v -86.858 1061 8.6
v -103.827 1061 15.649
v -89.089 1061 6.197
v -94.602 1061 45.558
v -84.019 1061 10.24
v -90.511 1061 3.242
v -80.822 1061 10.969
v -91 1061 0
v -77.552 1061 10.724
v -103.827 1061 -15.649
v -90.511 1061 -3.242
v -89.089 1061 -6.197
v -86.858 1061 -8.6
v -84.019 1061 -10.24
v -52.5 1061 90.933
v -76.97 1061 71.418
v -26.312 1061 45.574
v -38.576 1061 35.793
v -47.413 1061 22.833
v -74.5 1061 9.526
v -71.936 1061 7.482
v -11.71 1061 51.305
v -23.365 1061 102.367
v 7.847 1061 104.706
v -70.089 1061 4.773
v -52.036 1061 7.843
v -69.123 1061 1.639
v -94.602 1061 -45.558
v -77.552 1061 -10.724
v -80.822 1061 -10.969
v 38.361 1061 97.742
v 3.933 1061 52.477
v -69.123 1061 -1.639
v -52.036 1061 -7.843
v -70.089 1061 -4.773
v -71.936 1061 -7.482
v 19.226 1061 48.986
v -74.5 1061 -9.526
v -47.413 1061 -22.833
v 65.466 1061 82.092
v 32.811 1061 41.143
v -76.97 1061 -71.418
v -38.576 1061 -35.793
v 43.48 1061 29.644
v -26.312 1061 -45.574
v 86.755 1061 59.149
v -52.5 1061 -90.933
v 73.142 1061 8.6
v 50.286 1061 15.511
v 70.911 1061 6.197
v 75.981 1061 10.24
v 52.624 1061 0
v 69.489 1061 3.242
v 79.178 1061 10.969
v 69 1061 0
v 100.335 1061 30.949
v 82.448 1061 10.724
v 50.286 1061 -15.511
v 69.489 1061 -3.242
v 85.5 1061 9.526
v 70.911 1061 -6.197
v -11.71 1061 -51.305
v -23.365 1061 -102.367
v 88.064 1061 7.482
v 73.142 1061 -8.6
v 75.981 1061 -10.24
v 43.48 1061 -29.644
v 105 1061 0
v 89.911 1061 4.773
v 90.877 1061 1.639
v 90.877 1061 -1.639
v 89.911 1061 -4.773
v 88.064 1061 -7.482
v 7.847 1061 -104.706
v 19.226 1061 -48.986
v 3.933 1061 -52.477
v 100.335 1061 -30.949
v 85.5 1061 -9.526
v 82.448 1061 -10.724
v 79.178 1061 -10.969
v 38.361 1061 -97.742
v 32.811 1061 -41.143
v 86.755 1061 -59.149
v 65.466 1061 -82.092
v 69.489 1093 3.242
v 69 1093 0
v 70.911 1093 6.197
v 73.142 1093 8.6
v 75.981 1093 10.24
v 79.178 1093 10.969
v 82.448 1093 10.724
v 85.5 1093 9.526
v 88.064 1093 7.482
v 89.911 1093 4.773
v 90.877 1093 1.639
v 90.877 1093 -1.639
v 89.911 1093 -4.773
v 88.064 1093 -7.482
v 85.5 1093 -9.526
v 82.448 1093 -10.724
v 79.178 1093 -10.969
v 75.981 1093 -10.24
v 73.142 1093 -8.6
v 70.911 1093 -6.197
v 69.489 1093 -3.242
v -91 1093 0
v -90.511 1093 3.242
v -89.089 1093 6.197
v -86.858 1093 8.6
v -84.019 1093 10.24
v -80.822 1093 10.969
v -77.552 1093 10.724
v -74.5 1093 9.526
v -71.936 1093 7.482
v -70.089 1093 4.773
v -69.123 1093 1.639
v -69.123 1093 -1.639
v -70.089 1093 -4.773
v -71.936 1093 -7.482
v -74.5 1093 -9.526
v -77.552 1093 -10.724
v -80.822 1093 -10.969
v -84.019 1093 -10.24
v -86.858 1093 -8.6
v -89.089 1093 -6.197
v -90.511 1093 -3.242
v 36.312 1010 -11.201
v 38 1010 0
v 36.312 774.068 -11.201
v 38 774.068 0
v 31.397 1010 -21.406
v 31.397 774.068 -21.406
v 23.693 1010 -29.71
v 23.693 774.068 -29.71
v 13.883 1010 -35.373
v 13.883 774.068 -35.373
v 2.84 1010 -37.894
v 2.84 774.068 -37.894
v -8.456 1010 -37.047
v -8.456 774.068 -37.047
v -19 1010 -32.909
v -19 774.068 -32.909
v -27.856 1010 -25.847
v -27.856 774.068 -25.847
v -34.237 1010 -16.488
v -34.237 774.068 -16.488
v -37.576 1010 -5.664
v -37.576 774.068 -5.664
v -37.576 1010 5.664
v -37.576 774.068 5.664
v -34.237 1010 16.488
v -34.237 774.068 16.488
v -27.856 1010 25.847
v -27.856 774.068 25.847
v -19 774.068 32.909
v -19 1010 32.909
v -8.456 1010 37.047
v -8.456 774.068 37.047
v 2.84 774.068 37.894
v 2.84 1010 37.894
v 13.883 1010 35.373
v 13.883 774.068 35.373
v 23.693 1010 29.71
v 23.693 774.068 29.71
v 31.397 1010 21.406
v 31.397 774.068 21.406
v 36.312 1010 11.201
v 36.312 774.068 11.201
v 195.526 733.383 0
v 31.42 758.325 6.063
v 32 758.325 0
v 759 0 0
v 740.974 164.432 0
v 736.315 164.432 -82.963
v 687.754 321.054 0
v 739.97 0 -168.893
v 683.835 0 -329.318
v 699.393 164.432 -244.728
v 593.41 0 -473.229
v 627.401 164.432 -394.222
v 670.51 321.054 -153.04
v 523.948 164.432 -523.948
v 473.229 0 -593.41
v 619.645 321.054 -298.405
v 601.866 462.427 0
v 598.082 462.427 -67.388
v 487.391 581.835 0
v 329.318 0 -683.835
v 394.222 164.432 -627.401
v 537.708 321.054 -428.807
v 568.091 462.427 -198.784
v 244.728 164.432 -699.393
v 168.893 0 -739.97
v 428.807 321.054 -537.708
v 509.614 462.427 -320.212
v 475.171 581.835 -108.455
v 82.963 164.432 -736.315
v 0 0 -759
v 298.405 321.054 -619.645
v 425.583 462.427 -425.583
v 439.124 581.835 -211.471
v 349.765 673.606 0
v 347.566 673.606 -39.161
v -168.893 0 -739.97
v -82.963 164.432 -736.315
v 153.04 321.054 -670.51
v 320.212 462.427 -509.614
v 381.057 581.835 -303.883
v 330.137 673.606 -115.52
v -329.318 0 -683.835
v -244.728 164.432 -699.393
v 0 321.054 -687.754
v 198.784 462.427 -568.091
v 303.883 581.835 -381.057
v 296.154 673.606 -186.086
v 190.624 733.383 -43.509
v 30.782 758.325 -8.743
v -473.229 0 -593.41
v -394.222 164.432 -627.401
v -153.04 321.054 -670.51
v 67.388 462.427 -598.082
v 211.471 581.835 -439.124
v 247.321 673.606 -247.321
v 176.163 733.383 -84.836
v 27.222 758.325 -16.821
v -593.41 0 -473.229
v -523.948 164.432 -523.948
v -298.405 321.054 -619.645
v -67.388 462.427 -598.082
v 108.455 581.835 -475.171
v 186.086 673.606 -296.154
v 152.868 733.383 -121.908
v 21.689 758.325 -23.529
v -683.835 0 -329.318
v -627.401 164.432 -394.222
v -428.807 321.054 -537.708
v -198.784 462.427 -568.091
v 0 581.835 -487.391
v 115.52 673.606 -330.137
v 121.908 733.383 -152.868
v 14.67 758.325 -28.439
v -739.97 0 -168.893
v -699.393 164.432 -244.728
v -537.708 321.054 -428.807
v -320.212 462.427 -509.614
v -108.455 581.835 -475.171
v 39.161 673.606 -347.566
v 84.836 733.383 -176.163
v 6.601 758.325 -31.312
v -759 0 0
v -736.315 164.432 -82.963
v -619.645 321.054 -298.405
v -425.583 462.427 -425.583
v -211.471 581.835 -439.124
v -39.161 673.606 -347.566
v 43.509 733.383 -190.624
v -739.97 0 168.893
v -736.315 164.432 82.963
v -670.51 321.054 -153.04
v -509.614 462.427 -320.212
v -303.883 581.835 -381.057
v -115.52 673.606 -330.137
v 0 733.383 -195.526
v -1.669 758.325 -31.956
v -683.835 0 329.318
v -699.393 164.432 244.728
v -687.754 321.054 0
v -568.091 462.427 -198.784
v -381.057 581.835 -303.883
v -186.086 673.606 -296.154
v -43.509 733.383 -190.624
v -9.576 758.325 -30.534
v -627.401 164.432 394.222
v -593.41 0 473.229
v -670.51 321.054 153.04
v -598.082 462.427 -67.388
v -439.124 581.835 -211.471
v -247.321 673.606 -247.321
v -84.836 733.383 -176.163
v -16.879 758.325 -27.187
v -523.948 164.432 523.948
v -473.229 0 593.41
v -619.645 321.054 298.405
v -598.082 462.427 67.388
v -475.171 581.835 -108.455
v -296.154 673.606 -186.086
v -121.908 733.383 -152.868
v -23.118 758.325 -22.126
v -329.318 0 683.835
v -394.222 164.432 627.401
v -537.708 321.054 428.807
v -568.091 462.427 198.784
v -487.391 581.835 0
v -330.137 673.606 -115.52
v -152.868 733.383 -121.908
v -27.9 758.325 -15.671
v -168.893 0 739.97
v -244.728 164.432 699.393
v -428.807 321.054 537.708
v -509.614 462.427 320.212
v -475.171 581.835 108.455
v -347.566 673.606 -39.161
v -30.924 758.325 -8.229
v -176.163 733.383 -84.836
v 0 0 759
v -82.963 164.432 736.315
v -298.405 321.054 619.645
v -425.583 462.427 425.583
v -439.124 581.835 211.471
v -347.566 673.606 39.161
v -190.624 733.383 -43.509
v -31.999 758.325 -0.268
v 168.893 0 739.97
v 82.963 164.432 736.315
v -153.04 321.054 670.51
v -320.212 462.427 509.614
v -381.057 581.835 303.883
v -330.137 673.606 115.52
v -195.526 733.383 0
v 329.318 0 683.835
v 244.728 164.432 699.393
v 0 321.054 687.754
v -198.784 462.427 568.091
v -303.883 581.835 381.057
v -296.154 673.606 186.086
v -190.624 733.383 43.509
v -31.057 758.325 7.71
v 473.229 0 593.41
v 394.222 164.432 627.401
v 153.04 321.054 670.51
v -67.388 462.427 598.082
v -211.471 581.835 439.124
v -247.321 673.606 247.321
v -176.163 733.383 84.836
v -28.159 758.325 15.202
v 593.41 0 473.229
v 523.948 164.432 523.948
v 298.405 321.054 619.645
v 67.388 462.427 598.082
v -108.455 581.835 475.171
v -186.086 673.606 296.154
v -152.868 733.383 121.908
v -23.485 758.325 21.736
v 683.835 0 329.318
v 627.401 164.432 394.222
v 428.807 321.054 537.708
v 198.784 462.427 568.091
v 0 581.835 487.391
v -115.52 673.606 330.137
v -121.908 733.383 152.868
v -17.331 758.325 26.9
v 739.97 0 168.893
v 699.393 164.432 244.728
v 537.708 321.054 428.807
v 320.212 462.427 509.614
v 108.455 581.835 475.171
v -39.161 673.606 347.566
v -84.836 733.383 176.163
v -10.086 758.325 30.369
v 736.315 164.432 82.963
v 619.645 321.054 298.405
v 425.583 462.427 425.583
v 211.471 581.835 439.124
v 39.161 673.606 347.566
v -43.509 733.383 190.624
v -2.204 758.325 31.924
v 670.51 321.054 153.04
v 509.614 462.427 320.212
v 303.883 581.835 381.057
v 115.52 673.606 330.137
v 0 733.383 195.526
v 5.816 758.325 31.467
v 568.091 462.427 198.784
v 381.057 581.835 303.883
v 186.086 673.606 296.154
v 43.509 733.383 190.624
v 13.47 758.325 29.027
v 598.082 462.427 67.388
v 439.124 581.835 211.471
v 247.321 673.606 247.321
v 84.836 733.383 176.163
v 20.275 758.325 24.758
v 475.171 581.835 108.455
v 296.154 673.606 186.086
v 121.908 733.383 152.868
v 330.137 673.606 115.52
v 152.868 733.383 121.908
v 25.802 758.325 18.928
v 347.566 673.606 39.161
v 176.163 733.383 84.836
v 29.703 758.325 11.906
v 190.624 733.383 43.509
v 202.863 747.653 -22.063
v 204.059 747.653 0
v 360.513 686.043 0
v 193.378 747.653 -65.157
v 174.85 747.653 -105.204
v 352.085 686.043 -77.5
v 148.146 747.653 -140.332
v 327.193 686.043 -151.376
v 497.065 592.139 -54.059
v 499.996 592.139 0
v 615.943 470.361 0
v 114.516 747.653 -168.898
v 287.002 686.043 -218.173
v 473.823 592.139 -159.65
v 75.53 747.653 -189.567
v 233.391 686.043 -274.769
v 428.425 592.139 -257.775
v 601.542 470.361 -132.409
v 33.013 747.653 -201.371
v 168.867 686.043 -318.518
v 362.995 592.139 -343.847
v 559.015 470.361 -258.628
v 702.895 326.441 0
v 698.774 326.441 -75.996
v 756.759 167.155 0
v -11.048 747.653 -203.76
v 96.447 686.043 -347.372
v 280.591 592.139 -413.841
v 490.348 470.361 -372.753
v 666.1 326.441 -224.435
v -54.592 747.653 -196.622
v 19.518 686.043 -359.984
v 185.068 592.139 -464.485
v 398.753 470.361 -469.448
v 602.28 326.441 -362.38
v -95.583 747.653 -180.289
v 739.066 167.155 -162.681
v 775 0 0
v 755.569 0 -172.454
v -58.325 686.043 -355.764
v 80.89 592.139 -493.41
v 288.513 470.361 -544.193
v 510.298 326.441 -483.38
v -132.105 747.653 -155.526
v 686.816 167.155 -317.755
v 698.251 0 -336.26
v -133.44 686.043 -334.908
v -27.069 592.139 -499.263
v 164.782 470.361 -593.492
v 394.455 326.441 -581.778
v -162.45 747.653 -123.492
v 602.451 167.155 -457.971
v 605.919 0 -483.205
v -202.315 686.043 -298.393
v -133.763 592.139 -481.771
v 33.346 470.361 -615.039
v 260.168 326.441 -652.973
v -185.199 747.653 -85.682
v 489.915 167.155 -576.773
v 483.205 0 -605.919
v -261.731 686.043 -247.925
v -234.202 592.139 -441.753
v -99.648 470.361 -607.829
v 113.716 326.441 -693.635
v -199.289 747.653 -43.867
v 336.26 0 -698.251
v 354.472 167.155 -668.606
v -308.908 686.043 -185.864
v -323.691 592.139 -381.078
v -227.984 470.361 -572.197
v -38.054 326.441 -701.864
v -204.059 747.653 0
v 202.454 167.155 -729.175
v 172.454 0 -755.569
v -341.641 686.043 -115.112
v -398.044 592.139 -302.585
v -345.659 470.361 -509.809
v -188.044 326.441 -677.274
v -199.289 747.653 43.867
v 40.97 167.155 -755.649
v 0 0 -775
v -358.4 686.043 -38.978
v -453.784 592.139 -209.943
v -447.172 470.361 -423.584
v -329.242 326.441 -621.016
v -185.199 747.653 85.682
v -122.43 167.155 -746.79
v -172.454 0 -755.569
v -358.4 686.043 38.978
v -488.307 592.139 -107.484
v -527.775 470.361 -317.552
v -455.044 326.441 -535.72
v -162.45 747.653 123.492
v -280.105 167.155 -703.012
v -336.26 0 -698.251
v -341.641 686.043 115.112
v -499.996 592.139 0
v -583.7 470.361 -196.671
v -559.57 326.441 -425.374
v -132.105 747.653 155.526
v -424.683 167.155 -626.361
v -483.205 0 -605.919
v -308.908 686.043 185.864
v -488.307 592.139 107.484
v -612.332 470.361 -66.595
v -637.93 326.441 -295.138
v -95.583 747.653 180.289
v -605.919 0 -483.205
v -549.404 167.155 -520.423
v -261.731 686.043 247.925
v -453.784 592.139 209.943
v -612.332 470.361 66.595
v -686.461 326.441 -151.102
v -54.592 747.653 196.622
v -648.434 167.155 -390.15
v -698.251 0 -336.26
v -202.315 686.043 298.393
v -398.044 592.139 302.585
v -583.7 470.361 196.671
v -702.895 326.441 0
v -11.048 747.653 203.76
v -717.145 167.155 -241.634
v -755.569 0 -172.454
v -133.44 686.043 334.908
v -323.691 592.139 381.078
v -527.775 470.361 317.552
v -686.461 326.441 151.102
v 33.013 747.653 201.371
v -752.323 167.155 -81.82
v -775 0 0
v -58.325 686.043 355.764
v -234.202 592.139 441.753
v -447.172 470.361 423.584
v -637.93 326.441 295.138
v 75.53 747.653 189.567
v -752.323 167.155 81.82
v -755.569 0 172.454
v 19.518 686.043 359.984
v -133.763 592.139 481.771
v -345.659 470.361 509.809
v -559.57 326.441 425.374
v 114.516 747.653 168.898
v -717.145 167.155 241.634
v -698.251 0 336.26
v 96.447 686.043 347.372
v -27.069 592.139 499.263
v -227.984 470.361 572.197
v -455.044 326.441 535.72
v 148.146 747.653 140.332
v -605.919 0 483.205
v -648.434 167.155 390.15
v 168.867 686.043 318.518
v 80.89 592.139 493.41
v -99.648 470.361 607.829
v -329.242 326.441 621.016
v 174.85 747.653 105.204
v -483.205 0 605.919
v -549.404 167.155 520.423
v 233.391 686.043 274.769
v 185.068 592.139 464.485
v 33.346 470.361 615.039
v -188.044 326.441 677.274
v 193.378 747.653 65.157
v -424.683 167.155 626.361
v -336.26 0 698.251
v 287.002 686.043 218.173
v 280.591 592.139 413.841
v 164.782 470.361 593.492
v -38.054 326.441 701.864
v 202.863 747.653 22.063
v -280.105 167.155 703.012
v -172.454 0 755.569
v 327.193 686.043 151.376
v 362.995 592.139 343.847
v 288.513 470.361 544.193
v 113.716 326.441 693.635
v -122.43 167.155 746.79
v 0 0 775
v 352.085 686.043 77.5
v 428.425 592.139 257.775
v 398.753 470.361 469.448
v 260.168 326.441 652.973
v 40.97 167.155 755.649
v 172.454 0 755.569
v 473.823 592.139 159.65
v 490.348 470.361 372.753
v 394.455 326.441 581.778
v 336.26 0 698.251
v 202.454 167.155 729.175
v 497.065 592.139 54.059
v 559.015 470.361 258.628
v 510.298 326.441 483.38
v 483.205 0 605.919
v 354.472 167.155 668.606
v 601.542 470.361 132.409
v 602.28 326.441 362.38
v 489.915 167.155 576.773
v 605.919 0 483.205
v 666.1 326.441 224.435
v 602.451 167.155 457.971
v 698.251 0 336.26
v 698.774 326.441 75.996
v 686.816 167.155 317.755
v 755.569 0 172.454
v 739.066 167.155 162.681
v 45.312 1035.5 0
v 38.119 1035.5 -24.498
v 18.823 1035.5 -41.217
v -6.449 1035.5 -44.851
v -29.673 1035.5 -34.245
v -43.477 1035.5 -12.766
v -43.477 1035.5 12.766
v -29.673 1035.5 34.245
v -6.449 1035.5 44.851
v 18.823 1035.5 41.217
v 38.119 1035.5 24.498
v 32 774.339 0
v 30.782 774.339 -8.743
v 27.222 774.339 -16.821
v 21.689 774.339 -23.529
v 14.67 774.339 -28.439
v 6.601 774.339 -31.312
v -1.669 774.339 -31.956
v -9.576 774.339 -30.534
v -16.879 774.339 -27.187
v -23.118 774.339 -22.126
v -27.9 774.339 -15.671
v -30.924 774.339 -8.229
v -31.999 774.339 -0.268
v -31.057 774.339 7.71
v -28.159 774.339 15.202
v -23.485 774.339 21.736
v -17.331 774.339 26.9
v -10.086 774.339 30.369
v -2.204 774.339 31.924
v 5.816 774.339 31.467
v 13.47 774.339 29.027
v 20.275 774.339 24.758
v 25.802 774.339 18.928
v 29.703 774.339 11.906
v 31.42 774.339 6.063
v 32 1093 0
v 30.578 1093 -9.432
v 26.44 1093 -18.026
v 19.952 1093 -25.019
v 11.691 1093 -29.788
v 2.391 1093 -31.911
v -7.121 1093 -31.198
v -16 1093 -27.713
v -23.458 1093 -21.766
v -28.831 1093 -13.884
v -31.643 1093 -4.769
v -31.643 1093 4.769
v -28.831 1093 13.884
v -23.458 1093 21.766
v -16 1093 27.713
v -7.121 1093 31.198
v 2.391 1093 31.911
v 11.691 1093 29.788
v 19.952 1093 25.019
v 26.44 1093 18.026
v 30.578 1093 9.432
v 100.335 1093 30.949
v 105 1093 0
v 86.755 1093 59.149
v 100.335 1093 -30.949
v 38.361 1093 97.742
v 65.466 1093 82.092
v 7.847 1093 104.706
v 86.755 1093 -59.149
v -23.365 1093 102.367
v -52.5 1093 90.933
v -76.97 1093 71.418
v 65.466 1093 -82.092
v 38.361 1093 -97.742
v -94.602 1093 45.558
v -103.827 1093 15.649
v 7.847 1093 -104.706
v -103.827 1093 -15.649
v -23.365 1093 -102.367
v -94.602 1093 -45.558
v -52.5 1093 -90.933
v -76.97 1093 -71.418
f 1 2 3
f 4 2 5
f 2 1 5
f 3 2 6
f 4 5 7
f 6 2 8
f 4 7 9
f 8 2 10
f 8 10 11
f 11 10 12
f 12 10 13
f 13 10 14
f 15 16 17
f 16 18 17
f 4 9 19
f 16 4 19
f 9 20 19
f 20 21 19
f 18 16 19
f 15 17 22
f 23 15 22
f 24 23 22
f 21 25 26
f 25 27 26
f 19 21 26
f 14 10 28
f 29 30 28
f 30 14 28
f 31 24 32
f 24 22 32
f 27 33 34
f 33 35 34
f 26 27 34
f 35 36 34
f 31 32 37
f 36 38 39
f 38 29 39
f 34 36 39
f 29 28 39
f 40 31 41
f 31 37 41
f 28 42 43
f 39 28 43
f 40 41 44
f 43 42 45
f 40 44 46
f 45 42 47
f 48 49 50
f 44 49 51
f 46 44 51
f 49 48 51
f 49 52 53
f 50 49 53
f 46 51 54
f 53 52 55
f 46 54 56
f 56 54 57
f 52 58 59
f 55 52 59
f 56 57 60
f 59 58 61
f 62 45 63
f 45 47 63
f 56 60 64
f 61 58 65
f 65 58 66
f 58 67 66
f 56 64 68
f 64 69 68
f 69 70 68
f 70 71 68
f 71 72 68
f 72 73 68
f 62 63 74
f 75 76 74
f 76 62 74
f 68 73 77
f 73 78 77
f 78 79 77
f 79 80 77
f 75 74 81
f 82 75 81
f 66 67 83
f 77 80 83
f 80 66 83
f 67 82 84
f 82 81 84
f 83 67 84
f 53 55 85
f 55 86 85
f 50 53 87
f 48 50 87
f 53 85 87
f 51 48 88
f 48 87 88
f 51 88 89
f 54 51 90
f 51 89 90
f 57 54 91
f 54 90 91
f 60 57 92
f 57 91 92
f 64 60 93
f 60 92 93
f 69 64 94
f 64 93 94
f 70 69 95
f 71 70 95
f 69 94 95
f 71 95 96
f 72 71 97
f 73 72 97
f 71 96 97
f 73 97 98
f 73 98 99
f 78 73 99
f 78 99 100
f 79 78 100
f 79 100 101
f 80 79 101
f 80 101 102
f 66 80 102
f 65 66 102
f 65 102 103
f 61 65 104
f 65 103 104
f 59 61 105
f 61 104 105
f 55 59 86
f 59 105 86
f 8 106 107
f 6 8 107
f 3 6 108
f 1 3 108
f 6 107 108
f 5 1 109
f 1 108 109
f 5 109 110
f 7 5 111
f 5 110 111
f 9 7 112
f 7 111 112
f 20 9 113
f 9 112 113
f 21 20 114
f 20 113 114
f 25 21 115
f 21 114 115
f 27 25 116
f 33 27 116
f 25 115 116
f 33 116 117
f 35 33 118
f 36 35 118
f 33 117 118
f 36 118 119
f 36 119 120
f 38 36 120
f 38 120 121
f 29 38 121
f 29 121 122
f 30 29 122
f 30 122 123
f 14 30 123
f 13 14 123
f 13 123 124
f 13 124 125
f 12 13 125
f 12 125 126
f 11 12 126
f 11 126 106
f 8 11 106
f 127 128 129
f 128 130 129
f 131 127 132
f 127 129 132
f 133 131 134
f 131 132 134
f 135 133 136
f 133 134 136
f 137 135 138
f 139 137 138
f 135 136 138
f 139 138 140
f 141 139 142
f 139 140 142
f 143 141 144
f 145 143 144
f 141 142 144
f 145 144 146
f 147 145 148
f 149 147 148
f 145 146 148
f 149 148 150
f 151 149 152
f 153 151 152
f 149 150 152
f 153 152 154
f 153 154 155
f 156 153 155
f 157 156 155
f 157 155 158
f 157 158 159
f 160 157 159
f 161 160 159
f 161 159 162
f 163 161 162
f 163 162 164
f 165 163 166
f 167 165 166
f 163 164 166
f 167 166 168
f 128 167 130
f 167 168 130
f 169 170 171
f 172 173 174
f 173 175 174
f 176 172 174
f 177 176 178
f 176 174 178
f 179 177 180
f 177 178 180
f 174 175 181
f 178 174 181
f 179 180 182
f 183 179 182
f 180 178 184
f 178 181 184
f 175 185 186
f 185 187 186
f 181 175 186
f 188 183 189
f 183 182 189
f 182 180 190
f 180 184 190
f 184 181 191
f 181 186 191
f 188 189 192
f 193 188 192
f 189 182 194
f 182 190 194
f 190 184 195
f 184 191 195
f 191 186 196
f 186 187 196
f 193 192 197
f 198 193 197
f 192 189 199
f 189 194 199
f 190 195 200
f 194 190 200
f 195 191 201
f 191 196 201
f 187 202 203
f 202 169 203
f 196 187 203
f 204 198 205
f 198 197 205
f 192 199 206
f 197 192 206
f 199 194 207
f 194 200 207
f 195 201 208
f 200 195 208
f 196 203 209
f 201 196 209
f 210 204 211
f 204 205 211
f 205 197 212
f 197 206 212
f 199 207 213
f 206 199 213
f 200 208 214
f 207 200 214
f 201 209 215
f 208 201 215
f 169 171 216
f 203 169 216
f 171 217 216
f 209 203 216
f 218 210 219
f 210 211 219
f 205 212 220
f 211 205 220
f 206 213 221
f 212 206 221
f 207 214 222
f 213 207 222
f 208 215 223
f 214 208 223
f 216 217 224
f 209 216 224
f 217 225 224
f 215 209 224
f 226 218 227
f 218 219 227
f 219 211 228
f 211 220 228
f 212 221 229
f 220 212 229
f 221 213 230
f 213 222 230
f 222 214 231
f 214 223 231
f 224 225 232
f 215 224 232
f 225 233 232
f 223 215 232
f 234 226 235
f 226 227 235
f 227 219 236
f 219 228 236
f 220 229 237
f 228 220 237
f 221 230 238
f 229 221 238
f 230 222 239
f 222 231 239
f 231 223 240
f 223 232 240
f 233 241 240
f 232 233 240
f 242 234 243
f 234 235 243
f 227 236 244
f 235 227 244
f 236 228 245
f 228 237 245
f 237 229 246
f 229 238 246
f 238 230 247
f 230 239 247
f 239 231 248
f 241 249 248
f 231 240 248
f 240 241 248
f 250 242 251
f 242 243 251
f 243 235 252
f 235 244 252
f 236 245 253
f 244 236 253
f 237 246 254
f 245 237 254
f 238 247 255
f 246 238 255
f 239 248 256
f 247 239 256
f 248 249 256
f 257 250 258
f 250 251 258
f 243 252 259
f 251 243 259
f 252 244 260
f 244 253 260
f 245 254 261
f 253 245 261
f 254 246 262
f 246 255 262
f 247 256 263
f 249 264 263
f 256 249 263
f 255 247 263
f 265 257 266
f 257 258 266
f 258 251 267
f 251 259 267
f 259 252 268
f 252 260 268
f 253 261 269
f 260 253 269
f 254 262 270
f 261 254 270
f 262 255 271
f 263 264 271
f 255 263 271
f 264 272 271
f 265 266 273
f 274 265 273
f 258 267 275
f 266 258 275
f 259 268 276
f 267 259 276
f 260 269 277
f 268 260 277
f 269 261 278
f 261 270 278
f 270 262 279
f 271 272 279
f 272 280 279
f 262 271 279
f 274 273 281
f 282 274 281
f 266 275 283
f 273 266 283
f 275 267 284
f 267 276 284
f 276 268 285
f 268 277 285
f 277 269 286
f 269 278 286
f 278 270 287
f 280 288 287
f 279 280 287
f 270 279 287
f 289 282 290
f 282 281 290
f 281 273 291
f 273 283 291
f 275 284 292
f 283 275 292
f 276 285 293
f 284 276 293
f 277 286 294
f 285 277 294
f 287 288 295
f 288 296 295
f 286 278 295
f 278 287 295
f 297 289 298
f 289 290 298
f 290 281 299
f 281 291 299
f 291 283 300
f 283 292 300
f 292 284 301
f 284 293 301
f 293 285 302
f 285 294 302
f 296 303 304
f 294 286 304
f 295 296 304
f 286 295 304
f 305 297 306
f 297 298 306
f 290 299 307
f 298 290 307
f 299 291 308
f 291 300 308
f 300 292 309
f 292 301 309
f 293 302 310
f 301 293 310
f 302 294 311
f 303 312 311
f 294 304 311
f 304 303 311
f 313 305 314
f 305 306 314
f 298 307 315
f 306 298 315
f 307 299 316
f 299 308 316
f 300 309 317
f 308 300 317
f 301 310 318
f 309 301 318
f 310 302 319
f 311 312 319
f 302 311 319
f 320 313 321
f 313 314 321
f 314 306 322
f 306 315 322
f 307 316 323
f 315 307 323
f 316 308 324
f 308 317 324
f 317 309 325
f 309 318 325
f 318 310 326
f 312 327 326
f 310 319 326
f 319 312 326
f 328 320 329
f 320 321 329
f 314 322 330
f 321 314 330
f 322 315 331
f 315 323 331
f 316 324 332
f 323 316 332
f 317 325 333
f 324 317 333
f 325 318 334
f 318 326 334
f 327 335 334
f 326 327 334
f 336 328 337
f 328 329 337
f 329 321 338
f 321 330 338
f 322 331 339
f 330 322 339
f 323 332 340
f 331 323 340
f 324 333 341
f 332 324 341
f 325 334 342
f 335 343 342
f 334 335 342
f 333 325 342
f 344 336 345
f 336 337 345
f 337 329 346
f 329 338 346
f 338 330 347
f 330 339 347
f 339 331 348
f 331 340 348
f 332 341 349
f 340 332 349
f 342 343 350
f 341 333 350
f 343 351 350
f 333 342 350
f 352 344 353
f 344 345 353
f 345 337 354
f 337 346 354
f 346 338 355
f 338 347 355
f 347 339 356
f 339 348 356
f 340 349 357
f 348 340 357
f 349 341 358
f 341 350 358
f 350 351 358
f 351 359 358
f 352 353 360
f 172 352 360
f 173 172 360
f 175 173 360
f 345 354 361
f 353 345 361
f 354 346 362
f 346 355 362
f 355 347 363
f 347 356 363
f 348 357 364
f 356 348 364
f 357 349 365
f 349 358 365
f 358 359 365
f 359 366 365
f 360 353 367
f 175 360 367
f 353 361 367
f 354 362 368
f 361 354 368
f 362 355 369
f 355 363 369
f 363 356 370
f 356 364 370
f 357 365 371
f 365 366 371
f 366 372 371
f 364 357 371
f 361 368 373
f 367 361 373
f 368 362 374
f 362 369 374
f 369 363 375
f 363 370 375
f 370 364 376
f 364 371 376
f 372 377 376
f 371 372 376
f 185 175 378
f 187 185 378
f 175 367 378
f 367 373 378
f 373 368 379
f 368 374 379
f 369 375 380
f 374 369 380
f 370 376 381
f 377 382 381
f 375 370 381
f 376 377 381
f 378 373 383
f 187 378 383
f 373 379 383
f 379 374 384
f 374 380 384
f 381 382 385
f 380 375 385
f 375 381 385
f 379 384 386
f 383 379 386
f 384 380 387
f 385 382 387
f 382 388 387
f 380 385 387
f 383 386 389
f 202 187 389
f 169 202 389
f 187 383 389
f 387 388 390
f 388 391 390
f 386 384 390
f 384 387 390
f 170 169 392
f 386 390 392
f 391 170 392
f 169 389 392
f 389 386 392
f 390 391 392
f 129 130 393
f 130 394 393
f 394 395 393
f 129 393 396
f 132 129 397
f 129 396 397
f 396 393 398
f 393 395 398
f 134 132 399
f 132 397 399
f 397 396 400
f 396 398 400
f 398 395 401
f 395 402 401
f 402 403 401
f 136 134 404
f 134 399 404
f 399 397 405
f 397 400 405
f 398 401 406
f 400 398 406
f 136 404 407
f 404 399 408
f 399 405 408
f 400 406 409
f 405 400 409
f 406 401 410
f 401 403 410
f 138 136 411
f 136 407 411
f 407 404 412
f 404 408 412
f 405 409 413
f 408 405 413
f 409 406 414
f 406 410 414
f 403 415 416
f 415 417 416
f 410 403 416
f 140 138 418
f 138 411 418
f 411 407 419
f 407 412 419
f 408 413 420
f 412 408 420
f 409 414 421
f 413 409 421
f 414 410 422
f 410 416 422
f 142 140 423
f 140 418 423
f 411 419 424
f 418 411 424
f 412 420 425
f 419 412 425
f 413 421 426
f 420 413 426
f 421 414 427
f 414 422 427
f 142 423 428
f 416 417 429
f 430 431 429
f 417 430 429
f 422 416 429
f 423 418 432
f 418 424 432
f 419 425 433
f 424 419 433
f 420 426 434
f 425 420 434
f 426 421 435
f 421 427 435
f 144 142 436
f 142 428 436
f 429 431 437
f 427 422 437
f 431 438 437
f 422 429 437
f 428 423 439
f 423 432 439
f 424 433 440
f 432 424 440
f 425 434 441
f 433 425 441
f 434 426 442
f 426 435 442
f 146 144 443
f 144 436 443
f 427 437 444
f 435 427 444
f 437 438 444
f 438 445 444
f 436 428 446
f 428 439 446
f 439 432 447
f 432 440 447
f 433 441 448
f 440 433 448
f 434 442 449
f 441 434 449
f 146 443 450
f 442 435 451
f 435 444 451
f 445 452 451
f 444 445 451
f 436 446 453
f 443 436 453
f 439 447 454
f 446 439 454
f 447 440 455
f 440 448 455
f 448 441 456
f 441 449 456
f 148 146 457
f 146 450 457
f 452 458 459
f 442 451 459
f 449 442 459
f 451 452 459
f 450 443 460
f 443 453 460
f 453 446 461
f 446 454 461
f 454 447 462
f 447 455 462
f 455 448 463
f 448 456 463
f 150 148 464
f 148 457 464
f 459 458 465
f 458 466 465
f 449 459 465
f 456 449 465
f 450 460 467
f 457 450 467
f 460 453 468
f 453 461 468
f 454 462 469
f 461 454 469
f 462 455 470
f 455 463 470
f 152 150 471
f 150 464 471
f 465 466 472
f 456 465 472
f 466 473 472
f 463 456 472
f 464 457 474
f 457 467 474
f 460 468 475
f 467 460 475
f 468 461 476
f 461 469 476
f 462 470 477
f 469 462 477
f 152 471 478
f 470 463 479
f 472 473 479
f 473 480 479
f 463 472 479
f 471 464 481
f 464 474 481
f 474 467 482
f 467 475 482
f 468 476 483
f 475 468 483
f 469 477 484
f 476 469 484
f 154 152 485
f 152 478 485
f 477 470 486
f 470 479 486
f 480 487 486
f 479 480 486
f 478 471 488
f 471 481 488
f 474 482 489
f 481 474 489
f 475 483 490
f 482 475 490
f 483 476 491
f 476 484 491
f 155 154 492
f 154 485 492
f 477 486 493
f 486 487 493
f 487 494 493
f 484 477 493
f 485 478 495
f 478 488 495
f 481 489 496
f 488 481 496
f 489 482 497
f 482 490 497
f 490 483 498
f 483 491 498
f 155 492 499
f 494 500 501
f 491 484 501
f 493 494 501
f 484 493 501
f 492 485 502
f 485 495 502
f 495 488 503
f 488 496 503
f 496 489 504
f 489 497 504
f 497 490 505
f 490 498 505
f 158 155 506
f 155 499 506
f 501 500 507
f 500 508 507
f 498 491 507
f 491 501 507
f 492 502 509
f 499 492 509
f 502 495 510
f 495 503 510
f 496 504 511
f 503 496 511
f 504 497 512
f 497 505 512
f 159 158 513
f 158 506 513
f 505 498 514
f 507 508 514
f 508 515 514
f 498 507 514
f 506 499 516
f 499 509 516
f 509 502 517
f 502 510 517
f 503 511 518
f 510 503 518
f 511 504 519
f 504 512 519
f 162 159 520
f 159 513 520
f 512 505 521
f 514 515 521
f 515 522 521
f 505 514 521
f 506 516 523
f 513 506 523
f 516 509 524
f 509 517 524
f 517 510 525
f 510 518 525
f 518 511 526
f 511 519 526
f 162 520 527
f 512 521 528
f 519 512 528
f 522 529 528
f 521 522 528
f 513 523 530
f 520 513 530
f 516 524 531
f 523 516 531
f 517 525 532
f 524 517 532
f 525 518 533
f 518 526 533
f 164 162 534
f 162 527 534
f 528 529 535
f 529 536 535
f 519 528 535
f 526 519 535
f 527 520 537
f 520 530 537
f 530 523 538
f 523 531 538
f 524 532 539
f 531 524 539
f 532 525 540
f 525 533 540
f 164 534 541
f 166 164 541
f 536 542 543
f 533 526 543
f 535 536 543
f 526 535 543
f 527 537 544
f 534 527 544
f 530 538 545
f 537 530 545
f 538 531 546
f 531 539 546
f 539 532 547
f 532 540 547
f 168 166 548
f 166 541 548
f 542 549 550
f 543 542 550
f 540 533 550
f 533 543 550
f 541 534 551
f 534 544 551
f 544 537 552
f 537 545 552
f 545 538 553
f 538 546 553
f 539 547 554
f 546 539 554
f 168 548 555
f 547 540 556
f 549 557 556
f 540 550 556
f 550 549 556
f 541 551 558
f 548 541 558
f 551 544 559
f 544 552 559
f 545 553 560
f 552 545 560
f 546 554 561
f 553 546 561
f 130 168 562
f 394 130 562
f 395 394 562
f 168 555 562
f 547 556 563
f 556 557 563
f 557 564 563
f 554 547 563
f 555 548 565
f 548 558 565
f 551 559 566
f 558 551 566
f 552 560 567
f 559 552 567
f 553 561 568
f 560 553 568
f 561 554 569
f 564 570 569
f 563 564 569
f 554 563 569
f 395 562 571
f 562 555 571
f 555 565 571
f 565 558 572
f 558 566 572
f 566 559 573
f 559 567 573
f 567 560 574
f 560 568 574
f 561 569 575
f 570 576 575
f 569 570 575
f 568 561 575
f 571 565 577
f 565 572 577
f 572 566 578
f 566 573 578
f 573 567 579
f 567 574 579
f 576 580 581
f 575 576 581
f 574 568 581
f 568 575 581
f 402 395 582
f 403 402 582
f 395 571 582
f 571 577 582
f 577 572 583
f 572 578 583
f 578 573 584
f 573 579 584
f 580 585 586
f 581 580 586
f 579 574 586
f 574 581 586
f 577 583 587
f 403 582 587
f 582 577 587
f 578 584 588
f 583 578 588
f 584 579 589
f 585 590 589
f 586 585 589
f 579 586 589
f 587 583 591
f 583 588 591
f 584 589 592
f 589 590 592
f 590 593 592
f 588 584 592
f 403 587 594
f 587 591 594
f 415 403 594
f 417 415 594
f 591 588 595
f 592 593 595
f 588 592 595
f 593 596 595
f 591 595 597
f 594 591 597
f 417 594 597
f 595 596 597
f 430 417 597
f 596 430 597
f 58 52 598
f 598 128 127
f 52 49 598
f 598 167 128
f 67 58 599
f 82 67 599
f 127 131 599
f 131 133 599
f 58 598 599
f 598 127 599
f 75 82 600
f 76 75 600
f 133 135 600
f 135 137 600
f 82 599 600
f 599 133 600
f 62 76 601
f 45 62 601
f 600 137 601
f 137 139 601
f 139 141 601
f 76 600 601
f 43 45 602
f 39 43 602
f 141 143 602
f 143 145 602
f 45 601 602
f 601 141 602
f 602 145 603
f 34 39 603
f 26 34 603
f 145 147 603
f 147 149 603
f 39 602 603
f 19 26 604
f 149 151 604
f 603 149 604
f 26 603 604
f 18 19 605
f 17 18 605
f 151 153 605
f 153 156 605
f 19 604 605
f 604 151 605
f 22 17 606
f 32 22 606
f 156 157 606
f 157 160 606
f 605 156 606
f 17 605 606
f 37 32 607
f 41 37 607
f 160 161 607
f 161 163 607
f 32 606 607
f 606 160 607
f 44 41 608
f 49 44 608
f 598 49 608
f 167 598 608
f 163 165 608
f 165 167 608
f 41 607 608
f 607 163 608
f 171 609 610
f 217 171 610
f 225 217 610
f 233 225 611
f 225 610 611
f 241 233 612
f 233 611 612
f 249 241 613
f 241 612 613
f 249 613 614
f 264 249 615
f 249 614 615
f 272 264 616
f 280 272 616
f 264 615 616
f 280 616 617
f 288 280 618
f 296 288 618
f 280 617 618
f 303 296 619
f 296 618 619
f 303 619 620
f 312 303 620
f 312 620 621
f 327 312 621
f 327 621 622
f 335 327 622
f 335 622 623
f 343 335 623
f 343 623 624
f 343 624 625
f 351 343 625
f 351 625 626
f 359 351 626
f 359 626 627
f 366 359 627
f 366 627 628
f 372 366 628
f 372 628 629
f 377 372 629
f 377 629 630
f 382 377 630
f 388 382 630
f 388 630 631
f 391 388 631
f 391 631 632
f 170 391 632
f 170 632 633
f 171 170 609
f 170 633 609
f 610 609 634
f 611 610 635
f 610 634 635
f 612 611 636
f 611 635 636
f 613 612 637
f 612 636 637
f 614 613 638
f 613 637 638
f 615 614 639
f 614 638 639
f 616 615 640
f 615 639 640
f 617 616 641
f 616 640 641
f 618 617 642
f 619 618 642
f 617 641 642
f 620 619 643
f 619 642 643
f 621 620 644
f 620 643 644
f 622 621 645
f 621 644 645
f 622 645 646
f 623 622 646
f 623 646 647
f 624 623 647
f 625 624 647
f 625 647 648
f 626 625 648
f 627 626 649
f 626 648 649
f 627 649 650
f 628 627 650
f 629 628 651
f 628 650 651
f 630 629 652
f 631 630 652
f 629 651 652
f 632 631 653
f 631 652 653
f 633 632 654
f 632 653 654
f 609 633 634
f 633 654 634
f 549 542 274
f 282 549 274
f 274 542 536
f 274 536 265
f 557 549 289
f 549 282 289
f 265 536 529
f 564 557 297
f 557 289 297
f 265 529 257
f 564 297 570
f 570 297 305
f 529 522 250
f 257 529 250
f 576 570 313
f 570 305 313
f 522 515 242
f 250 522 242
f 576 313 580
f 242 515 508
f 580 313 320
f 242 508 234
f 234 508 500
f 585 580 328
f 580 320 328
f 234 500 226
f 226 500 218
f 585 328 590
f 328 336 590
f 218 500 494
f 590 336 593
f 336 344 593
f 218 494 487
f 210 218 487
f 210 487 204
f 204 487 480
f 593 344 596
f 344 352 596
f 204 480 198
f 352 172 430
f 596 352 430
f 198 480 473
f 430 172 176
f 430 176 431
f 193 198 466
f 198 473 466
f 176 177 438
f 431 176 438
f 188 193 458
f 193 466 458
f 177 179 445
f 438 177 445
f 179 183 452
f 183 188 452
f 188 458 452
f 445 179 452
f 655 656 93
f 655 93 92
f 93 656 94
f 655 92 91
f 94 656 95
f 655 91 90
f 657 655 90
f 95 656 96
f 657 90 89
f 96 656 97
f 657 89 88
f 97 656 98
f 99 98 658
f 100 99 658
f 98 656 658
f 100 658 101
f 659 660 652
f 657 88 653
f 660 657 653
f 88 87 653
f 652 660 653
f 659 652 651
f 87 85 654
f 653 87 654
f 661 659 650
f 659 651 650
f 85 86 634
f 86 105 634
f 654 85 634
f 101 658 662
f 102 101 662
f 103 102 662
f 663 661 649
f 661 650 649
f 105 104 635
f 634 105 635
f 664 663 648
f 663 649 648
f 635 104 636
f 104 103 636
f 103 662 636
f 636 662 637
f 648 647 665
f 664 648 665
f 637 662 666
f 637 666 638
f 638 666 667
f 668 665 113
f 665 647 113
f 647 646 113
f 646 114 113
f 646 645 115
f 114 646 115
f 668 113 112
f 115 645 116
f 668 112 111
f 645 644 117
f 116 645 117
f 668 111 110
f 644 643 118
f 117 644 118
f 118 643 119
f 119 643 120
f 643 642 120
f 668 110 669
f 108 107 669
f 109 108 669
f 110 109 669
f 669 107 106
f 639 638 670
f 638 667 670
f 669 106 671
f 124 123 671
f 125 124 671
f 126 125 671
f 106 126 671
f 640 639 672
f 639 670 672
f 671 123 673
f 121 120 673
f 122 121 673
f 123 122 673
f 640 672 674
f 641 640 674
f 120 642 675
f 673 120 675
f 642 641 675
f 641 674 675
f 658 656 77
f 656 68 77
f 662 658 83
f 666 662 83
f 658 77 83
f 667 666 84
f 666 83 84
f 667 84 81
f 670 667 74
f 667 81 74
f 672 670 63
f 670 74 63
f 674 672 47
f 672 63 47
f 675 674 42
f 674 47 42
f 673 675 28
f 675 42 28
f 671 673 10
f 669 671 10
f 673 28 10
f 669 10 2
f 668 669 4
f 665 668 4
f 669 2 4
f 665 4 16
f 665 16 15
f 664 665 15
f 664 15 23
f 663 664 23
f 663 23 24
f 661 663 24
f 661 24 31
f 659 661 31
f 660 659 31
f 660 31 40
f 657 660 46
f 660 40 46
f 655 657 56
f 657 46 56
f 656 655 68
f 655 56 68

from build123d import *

# Parameters (mm, degrees)
CUT_EXTRUDE1_REACH = 1549.869
SKETCH3_R          = 11
SKETCH4_R          = 32
CUT_EXTRUDE2_DEPTH = 500


with BuildPart() as part:
    # Sketch1 → Revolve1 (revolve)
    with BuildSketch(Plane.XY):
        with BuildLine():
            Line((0, 759), (0, 775))
            ThreePointArc((0, 775), (548.00775542, 548.00775542), (775, 0))
            Line((775, 0), (759, 0))
            ThreePointArc((759, 0), (536.694046921, 536.694046921), (0, 759))
        make_face()
    revolve(axis=Axis((0, 0, 0), (0, 1, 0)))

    # Sketch2 → Revolve2 (revolve)
    with BuildSketch(Plane.XY):
        Polygon((105, 1093), (105, 1061), (52.624014674, 1061), (38, 1010), (38, 774.067826486), (32, 774.067826486), (32, 1093), align=None)
    revolve(axis=Axis((0, 775, 0), (0, 1, 0)))

    # Sketch3 → Cut-Extrude1 (cut, up to next)
    with BuildSketch(Plane(origin=(0, 1093, 0), x_dir=(1, 0, 0), z_dir=(0, 1, 0)), mode=Mode.PRIVATE) as cut_extrude1_sk1:
        with Locations(Location((-80, 0, 0), (0, 0, 180))):
            Circle(SKETCH3_R)
    cut_extrude1_tool1 = extrude(cut_extrude1_sk1.sketch, amount=-CUT_EXTRUDE1_REACH, mode=Mode.PRIVATE) & part.part
    # Sketch3 → Cut-Extrude1 (cut, up to next)
    with BuildSketch(Plane(origin=(0, 1093, 0), x_dir=(1, 0, 0), z_dir=(0, 1, 0)), mode=Mode.PRIVATE) as cut_extrude1_sk2:
        with Locations(Location((80, 0, 0), (0, 0, 180))):
            Circle(SKETCH3_R)
    cut_extrude1_tool2 = extrude(cut_extrude1_sk2.sketch, amount=-CUT_EXTRUDE1_REACH, mode=Mode.PRIVATE) & part.part
    add(cut_extrude1_tool1.solids().sort_by_distance((-80, 1093, 0))[0], mode=Mode.SUBTRACT)
    add(cut_extrude1_tool2.solids().sort_by_distance((80, 1093, 0))[0], mode=Mode.SUBTRACT)

    # Sketch4 → Cut-Extrude2 (cut)
    with BuildSketch(Plane(origin=(0, 1093, 0), x_dir=(1, 0, 0), z_dir=(0, 1, 0))):
        Circle(SKETCH4_R)
    extrude(amount=-CUT_EXTRUDE2_DEPTH, mode=Mode.SUBTRACT)


solid = part.part
